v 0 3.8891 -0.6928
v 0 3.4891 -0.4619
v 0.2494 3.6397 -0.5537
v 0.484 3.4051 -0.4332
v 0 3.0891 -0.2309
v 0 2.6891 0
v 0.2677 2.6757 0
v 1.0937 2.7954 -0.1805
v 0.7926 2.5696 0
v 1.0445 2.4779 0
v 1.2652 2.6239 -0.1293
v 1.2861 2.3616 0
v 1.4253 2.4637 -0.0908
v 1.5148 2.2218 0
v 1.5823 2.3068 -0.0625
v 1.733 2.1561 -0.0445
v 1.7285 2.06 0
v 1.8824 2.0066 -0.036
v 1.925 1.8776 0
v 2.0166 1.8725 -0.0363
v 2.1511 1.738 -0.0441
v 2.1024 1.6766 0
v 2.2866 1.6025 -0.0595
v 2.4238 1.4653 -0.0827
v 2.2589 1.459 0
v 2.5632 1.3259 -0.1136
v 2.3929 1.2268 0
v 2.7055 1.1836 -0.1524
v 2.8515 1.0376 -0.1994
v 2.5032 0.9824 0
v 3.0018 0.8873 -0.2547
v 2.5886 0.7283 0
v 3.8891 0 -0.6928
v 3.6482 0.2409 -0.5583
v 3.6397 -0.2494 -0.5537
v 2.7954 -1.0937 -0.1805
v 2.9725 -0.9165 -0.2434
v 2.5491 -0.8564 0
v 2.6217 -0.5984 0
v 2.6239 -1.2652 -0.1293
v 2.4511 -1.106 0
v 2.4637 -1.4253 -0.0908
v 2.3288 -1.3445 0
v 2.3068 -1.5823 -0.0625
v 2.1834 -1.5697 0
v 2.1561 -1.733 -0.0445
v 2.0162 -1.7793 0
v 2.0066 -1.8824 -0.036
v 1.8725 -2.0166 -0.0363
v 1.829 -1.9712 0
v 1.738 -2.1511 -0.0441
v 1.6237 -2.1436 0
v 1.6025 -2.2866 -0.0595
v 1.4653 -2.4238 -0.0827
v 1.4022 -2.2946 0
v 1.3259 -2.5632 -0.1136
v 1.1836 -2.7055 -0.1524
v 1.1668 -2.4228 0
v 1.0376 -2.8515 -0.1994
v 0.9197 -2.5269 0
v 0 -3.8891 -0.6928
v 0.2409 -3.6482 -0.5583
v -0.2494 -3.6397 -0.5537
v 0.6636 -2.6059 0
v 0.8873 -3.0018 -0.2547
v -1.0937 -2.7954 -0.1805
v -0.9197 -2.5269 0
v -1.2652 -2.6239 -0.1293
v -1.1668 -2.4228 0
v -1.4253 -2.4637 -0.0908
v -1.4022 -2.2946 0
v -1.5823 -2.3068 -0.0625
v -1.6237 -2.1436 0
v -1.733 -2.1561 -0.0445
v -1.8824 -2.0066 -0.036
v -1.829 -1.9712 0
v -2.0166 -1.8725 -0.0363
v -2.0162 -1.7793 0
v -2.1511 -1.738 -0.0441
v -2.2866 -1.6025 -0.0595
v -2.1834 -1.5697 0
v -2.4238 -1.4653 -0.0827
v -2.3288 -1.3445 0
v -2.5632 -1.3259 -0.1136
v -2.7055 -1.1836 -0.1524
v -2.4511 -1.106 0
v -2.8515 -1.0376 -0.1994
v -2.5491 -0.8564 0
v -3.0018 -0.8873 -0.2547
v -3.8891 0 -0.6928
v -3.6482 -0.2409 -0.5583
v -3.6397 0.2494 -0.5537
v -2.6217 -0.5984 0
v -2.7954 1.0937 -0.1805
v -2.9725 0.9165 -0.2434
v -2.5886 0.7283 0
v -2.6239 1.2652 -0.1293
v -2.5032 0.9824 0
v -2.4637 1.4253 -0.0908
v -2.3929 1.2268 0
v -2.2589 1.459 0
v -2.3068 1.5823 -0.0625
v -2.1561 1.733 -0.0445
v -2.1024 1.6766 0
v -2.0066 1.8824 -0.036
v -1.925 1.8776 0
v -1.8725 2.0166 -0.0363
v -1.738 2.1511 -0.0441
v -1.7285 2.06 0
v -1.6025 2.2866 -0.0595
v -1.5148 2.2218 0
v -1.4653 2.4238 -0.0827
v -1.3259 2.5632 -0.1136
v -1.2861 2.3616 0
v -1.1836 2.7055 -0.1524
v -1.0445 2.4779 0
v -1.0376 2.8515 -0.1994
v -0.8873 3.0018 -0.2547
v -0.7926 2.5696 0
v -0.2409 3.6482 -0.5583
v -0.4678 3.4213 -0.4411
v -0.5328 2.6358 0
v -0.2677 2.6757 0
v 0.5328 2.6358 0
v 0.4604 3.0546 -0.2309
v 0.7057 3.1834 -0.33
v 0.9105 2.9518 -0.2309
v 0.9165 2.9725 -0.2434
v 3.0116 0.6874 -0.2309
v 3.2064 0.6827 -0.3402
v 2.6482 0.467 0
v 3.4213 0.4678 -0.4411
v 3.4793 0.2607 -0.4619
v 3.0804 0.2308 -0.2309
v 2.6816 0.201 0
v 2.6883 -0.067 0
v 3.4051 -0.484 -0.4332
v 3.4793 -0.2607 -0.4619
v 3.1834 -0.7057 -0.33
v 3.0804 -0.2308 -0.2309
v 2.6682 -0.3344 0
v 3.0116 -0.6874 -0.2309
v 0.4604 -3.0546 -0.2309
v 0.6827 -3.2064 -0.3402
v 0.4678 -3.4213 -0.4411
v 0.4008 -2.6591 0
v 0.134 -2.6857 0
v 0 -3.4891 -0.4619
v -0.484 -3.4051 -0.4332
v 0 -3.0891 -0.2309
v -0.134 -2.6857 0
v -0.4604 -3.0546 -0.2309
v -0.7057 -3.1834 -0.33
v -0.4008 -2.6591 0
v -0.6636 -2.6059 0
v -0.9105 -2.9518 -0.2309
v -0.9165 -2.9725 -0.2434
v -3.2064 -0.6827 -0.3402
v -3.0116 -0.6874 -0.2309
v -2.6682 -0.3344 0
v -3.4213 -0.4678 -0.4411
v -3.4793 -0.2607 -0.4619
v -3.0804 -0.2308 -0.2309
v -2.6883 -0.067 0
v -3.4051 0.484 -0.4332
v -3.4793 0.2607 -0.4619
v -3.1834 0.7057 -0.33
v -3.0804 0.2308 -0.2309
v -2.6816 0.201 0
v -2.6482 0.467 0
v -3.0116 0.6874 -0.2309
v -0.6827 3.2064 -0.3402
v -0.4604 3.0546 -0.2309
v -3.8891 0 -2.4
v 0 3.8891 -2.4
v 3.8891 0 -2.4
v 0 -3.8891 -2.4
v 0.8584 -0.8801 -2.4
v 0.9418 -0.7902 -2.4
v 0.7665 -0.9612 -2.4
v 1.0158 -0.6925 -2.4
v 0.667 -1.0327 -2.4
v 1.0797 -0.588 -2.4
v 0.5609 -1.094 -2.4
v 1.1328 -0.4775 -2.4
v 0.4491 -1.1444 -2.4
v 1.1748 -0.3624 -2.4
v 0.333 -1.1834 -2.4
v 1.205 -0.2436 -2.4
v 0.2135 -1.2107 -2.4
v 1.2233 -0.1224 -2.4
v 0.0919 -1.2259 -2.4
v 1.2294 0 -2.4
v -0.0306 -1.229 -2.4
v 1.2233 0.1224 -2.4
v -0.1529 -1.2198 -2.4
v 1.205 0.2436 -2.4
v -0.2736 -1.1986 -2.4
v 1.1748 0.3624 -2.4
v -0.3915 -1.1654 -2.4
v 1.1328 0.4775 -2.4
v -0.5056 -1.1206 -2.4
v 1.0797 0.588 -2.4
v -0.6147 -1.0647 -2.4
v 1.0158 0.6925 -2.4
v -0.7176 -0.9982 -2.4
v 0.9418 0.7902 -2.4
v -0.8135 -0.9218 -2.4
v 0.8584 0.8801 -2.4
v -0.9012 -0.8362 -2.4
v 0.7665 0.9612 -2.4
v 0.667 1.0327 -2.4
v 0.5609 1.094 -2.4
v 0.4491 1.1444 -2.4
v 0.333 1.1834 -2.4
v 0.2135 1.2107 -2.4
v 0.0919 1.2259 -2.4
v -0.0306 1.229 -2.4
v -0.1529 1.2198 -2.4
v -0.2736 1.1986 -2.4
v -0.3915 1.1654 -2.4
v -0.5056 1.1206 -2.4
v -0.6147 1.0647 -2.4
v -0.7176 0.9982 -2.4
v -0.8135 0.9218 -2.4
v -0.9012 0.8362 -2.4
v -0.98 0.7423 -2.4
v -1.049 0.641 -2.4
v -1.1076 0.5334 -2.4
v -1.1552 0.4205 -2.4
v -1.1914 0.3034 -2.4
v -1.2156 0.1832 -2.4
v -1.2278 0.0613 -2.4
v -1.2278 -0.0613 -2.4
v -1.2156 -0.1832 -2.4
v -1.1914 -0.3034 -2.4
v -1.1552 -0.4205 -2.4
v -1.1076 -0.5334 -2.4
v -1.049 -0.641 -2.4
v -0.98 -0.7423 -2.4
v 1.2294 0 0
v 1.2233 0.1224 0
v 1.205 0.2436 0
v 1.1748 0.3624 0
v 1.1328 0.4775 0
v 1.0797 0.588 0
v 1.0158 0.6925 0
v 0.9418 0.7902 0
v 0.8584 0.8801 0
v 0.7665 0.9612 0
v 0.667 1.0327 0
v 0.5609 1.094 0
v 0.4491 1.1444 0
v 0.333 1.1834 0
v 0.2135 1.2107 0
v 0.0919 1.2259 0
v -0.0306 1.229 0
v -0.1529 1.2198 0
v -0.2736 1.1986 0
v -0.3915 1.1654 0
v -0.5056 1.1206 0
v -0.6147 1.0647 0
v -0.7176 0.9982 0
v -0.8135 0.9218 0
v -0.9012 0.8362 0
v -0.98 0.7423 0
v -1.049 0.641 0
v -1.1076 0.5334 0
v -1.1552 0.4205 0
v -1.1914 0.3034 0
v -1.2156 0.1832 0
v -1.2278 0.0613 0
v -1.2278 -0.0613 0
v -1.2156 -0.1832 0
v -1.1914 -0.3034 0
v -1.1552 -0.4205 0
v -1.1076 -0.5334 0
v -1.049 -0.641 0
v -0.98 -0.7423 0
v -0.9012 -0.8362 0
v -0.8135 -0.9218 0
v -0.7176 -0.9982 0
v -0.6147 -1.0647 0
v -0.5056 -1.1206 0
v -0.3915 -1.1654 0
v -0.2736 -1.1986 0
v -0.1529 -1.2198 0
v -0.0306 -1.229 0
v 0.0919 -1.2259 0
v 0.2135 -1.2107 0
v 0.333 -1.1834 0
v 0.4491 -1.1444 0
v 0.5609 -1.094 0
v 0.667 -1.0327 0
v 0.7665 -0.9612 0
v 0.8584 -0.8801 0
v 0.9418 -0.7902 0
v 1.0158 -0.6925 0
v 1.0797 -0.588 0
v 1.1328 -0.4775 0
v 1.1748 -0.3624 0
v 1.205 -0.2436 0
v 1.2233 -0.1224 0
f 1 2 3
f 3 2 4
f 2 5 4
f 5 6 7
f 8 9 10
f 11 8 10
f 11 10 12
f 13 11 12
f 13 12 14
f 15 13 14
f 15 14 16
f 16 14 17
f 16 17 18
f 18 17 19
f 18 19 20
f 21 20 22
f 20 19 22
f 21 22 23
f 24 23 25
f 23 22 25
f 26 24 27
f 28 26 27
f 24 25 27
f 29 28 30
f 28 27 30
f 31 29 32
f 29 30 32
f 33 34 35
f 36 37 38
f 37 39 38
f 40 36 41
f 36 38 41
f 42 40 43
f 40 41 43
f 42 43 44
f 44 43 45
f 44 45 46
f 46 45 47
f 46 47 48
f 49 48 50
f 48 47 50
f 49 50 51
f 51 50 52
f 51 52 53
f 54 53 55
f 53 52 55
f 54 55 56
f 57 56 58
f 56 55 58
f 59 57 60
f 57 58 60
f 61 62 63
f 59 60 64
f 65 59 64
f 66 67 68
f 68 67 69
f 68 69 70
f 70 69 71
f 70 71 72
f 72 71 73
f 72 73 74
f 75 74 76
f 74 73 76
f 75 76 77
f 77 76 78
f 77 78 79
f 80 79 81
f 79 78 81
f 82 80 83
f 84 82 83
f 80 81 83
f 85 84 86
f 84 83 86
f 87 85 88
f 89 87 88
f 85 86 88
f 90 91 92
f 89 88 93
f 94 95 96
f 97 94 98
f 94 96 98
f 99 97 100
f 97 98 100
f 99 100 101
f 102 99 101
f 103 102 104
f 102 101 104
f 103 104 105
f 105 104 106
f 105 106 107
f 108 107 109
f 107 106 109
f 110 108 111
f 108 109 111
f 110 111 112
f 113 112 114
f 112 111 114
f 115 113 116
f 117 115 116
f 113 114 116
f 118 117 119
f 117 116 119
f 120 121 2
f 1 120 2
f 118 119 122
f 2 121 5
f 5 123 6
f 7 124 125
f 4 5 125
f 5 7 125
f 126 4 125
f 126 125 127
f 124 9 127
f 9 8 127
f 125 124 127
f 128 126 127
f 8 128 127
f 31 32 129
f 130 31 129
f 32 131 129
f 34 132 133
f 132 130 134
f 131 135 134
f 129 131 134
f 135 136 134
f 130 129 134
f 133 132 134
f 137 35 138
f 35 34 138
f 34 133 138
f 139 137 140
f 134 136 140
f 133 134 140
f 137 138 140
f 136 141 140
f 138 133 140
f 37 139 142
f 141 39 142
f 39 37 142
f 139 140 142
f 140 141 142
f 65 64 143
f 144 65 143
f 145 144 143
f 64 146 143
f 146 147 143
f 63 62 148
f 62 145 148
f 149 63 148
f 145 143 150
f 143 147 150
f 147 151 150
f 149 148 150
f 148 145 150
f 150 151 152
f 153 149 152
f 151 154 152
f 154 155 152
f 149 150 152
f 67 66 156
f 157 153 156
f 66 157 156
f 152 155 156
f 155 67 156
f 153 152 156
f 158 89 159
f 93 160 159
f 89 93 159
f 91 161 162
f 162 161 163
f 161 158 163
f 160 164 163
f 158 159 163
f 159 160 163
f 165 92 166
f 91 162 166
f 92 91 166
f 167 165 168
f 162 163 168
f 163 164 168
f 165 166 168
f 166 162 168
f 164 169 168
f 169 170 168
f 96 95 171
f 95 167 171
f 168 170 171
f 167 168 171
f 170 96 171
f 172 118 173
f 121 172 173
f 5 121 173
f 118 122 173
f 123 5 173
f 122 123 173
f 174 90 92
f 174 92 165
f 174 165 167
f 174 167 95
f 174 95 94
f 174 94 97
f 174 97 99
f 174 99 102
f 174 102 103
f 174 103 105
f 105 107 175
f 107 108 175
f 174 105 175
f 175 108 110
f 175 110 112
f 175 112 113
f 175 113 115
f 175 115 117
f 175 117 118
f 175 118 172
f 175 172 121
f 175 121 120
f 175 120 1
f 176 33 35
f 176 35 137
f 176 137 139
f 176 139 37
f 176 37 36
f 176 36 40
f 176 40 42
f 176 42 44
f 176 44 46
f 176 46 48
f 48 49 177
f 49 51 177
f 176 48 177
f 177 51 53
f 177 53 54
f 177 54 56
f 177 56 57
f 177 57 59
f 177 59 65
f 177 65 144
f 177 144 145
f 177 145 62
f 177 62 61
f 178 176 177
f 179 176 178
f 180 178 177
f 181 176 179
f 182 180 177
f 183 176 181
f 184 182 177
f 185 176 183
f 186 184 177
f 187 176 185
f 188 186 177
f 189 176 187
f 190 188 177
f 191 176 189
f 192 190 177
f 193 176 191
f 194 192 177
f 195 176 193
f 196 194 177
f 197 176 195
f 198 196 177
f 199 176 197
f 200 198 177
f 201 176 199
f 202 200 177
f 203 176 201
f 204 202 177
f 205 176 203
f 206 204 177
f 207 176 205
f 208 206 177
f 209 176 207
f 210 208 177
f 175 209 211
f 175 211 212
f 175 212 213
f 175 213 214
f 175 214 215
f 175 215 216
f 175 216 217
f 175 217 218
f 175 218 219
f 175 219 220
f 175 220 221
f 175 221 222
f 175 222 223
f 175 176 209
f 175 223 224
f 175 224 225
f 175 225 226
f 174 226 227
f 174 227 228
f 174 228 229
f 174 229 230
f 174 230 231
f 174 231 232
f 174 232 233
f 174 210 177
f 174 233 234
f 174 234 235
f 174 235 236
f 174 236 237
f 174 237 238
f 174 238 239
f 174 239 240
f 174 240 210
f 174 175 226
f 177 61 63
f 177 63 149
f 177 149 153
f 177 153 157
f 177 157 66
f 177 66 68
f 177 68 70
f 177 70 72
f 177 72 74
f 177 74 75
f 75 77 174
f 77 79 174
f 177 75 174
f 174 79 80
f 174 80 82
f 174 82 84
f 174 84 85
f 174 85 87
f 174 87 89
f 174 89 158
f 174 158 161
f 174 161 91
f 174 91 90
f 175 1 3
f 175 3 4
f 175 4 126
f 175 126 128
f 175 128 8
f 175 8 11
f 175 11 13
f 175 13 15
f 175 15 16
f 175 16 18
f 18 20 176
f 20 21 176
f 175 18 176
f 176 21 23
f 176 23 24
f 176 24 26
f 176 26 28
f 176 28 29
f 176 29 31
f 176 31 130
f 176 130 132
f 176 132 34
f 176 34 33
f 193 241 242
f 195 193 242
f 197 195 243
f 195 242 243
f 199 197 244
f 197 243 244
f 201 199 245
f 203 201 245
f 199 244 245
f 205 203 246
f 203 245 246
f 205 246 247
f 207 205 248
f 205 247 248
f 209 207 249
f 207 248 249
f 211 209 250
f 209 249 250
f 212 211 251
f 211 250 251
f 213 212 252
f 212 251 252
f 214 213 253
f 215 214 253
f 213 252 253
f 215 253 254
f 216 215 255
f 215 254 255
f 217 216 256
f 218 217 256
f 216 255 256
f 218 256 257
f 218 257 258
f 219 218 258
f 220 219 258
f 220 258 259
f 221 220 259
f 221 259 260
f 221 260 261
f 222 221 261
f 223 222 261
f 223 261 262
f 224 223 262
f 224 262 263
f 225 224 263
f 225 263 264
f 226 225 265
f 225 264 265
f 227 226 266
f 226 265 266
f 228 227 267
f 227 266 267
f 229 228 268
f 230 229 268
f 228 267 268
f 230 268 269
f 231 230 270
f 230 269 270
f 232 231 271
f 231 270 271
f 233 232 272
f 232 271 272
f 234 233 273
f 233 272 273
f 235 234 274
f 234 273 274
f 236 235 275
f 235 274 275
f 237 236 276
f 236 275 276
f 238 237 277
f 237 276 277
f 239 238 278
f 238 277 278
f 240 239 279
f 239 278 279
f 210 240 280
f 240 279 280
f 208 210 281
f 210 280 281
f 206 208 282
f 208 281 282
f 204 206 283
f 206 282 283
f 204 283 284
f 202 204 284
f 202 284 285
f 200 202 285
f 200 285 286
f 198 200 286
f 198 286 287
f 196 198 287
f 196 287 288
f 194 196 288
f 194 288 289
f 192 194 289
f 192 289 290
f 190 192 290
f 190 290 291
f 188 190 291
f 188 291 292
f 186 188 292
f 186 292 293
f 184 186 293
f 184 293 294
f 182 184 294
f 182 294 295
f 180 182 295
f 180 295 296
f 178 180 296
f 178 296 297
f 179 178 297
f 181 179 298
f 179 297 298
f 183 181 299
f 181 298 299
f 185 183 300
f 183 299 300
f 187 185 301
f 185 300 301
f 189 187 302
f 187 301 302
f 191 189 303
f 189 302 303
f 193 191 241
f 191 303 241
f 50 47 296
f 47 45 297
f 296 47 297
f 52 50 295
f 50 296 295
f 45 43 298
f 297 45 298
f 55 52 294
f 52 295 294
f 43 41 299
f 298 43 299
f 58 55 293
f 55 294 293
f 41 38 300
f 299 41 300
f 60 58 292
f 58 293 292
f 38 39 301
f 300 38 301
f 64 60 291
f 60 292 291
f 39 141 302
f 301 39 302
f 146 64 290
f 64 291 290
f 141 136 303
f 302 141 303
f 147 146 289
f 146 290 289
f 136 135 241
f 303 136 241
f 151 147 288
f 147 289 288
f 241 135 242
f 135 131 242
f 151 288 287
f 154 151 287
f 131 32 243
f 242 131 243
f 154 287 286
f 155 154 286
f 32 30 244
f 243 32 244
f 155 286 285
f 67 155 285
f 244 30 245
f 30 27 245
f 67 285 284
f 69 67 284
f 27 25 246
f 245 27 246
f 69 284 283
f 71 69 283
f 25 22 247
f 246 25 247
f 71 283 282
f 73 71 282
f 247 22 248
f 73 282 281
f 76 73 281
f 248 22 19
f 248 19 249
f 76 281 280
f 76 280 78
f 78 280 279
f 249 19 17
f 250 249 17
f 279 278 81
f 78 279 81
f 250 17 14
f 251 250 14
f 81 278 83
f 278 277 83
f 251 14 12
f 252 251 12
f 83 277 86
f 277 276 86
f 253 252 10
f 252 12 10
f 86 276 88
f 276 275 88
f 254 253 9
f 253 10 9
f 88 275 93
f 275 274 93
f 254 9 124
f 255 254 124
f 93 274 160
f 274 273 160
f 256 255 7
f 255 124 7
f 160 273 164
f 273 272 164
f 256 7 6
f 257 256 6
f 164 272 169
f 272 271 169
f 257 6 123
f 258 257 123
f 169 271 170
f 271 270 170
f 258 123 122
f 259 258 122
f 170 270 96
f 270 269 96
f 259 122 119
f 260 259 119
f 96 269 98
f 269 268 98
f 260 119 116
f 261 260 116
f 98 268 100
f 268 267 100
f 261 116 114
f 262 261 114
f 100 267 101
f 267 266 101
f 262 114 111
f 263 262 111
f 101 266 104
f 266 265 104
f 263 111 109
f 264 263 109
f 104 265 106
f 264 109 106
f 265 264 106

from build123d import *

# Parameters (mm, degrees)
SKETCH_7_R      = 1.229375
EXTRUDE_1_DEPTH = 2.4


with BuildPart() as part:
    # 草图7 → 凸台-拉伸1 (new body)
    with BuildSketch(Plane.XY):
        Polygon((-3.889087297, 0), (0, 3.889087297), (3.889087297, 0), (0, -3.889087297), align=None)
        Circle(SKETCH_7_R, mode=Mode.SUBTRACT)
    extrude(amount=-EXTRUDE_1_DEPTH)

    # 草图8 → 切除-旋转1 (revolve, cut)
    with BuildSketch(Plane(origin=(0, 0, 0), x_dir=(0, 0, -1), z_dir=(1, 0, 0))):
        Polygon((0.692820323, 3.889087297), (0, 2.689087297), (0, 3.889087297), align=None)
    revolve(axis=Axis((0, 0, 0), (0, 0, -1)), mode=Mode.SUBTRACT)


solid = part.part
